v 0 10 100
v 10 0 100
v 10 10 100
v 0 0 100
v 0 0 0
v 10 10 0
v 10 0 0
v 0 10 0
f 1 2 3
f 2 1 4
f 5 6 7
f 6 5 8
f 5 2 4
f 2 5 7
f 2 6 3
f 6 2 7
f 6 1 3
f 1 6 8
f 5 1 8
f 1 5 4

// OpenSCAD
$fn = 64;

size = 10.0;     // mm
length = 100.0;  // mm

cube([size, size, length], center=false);
